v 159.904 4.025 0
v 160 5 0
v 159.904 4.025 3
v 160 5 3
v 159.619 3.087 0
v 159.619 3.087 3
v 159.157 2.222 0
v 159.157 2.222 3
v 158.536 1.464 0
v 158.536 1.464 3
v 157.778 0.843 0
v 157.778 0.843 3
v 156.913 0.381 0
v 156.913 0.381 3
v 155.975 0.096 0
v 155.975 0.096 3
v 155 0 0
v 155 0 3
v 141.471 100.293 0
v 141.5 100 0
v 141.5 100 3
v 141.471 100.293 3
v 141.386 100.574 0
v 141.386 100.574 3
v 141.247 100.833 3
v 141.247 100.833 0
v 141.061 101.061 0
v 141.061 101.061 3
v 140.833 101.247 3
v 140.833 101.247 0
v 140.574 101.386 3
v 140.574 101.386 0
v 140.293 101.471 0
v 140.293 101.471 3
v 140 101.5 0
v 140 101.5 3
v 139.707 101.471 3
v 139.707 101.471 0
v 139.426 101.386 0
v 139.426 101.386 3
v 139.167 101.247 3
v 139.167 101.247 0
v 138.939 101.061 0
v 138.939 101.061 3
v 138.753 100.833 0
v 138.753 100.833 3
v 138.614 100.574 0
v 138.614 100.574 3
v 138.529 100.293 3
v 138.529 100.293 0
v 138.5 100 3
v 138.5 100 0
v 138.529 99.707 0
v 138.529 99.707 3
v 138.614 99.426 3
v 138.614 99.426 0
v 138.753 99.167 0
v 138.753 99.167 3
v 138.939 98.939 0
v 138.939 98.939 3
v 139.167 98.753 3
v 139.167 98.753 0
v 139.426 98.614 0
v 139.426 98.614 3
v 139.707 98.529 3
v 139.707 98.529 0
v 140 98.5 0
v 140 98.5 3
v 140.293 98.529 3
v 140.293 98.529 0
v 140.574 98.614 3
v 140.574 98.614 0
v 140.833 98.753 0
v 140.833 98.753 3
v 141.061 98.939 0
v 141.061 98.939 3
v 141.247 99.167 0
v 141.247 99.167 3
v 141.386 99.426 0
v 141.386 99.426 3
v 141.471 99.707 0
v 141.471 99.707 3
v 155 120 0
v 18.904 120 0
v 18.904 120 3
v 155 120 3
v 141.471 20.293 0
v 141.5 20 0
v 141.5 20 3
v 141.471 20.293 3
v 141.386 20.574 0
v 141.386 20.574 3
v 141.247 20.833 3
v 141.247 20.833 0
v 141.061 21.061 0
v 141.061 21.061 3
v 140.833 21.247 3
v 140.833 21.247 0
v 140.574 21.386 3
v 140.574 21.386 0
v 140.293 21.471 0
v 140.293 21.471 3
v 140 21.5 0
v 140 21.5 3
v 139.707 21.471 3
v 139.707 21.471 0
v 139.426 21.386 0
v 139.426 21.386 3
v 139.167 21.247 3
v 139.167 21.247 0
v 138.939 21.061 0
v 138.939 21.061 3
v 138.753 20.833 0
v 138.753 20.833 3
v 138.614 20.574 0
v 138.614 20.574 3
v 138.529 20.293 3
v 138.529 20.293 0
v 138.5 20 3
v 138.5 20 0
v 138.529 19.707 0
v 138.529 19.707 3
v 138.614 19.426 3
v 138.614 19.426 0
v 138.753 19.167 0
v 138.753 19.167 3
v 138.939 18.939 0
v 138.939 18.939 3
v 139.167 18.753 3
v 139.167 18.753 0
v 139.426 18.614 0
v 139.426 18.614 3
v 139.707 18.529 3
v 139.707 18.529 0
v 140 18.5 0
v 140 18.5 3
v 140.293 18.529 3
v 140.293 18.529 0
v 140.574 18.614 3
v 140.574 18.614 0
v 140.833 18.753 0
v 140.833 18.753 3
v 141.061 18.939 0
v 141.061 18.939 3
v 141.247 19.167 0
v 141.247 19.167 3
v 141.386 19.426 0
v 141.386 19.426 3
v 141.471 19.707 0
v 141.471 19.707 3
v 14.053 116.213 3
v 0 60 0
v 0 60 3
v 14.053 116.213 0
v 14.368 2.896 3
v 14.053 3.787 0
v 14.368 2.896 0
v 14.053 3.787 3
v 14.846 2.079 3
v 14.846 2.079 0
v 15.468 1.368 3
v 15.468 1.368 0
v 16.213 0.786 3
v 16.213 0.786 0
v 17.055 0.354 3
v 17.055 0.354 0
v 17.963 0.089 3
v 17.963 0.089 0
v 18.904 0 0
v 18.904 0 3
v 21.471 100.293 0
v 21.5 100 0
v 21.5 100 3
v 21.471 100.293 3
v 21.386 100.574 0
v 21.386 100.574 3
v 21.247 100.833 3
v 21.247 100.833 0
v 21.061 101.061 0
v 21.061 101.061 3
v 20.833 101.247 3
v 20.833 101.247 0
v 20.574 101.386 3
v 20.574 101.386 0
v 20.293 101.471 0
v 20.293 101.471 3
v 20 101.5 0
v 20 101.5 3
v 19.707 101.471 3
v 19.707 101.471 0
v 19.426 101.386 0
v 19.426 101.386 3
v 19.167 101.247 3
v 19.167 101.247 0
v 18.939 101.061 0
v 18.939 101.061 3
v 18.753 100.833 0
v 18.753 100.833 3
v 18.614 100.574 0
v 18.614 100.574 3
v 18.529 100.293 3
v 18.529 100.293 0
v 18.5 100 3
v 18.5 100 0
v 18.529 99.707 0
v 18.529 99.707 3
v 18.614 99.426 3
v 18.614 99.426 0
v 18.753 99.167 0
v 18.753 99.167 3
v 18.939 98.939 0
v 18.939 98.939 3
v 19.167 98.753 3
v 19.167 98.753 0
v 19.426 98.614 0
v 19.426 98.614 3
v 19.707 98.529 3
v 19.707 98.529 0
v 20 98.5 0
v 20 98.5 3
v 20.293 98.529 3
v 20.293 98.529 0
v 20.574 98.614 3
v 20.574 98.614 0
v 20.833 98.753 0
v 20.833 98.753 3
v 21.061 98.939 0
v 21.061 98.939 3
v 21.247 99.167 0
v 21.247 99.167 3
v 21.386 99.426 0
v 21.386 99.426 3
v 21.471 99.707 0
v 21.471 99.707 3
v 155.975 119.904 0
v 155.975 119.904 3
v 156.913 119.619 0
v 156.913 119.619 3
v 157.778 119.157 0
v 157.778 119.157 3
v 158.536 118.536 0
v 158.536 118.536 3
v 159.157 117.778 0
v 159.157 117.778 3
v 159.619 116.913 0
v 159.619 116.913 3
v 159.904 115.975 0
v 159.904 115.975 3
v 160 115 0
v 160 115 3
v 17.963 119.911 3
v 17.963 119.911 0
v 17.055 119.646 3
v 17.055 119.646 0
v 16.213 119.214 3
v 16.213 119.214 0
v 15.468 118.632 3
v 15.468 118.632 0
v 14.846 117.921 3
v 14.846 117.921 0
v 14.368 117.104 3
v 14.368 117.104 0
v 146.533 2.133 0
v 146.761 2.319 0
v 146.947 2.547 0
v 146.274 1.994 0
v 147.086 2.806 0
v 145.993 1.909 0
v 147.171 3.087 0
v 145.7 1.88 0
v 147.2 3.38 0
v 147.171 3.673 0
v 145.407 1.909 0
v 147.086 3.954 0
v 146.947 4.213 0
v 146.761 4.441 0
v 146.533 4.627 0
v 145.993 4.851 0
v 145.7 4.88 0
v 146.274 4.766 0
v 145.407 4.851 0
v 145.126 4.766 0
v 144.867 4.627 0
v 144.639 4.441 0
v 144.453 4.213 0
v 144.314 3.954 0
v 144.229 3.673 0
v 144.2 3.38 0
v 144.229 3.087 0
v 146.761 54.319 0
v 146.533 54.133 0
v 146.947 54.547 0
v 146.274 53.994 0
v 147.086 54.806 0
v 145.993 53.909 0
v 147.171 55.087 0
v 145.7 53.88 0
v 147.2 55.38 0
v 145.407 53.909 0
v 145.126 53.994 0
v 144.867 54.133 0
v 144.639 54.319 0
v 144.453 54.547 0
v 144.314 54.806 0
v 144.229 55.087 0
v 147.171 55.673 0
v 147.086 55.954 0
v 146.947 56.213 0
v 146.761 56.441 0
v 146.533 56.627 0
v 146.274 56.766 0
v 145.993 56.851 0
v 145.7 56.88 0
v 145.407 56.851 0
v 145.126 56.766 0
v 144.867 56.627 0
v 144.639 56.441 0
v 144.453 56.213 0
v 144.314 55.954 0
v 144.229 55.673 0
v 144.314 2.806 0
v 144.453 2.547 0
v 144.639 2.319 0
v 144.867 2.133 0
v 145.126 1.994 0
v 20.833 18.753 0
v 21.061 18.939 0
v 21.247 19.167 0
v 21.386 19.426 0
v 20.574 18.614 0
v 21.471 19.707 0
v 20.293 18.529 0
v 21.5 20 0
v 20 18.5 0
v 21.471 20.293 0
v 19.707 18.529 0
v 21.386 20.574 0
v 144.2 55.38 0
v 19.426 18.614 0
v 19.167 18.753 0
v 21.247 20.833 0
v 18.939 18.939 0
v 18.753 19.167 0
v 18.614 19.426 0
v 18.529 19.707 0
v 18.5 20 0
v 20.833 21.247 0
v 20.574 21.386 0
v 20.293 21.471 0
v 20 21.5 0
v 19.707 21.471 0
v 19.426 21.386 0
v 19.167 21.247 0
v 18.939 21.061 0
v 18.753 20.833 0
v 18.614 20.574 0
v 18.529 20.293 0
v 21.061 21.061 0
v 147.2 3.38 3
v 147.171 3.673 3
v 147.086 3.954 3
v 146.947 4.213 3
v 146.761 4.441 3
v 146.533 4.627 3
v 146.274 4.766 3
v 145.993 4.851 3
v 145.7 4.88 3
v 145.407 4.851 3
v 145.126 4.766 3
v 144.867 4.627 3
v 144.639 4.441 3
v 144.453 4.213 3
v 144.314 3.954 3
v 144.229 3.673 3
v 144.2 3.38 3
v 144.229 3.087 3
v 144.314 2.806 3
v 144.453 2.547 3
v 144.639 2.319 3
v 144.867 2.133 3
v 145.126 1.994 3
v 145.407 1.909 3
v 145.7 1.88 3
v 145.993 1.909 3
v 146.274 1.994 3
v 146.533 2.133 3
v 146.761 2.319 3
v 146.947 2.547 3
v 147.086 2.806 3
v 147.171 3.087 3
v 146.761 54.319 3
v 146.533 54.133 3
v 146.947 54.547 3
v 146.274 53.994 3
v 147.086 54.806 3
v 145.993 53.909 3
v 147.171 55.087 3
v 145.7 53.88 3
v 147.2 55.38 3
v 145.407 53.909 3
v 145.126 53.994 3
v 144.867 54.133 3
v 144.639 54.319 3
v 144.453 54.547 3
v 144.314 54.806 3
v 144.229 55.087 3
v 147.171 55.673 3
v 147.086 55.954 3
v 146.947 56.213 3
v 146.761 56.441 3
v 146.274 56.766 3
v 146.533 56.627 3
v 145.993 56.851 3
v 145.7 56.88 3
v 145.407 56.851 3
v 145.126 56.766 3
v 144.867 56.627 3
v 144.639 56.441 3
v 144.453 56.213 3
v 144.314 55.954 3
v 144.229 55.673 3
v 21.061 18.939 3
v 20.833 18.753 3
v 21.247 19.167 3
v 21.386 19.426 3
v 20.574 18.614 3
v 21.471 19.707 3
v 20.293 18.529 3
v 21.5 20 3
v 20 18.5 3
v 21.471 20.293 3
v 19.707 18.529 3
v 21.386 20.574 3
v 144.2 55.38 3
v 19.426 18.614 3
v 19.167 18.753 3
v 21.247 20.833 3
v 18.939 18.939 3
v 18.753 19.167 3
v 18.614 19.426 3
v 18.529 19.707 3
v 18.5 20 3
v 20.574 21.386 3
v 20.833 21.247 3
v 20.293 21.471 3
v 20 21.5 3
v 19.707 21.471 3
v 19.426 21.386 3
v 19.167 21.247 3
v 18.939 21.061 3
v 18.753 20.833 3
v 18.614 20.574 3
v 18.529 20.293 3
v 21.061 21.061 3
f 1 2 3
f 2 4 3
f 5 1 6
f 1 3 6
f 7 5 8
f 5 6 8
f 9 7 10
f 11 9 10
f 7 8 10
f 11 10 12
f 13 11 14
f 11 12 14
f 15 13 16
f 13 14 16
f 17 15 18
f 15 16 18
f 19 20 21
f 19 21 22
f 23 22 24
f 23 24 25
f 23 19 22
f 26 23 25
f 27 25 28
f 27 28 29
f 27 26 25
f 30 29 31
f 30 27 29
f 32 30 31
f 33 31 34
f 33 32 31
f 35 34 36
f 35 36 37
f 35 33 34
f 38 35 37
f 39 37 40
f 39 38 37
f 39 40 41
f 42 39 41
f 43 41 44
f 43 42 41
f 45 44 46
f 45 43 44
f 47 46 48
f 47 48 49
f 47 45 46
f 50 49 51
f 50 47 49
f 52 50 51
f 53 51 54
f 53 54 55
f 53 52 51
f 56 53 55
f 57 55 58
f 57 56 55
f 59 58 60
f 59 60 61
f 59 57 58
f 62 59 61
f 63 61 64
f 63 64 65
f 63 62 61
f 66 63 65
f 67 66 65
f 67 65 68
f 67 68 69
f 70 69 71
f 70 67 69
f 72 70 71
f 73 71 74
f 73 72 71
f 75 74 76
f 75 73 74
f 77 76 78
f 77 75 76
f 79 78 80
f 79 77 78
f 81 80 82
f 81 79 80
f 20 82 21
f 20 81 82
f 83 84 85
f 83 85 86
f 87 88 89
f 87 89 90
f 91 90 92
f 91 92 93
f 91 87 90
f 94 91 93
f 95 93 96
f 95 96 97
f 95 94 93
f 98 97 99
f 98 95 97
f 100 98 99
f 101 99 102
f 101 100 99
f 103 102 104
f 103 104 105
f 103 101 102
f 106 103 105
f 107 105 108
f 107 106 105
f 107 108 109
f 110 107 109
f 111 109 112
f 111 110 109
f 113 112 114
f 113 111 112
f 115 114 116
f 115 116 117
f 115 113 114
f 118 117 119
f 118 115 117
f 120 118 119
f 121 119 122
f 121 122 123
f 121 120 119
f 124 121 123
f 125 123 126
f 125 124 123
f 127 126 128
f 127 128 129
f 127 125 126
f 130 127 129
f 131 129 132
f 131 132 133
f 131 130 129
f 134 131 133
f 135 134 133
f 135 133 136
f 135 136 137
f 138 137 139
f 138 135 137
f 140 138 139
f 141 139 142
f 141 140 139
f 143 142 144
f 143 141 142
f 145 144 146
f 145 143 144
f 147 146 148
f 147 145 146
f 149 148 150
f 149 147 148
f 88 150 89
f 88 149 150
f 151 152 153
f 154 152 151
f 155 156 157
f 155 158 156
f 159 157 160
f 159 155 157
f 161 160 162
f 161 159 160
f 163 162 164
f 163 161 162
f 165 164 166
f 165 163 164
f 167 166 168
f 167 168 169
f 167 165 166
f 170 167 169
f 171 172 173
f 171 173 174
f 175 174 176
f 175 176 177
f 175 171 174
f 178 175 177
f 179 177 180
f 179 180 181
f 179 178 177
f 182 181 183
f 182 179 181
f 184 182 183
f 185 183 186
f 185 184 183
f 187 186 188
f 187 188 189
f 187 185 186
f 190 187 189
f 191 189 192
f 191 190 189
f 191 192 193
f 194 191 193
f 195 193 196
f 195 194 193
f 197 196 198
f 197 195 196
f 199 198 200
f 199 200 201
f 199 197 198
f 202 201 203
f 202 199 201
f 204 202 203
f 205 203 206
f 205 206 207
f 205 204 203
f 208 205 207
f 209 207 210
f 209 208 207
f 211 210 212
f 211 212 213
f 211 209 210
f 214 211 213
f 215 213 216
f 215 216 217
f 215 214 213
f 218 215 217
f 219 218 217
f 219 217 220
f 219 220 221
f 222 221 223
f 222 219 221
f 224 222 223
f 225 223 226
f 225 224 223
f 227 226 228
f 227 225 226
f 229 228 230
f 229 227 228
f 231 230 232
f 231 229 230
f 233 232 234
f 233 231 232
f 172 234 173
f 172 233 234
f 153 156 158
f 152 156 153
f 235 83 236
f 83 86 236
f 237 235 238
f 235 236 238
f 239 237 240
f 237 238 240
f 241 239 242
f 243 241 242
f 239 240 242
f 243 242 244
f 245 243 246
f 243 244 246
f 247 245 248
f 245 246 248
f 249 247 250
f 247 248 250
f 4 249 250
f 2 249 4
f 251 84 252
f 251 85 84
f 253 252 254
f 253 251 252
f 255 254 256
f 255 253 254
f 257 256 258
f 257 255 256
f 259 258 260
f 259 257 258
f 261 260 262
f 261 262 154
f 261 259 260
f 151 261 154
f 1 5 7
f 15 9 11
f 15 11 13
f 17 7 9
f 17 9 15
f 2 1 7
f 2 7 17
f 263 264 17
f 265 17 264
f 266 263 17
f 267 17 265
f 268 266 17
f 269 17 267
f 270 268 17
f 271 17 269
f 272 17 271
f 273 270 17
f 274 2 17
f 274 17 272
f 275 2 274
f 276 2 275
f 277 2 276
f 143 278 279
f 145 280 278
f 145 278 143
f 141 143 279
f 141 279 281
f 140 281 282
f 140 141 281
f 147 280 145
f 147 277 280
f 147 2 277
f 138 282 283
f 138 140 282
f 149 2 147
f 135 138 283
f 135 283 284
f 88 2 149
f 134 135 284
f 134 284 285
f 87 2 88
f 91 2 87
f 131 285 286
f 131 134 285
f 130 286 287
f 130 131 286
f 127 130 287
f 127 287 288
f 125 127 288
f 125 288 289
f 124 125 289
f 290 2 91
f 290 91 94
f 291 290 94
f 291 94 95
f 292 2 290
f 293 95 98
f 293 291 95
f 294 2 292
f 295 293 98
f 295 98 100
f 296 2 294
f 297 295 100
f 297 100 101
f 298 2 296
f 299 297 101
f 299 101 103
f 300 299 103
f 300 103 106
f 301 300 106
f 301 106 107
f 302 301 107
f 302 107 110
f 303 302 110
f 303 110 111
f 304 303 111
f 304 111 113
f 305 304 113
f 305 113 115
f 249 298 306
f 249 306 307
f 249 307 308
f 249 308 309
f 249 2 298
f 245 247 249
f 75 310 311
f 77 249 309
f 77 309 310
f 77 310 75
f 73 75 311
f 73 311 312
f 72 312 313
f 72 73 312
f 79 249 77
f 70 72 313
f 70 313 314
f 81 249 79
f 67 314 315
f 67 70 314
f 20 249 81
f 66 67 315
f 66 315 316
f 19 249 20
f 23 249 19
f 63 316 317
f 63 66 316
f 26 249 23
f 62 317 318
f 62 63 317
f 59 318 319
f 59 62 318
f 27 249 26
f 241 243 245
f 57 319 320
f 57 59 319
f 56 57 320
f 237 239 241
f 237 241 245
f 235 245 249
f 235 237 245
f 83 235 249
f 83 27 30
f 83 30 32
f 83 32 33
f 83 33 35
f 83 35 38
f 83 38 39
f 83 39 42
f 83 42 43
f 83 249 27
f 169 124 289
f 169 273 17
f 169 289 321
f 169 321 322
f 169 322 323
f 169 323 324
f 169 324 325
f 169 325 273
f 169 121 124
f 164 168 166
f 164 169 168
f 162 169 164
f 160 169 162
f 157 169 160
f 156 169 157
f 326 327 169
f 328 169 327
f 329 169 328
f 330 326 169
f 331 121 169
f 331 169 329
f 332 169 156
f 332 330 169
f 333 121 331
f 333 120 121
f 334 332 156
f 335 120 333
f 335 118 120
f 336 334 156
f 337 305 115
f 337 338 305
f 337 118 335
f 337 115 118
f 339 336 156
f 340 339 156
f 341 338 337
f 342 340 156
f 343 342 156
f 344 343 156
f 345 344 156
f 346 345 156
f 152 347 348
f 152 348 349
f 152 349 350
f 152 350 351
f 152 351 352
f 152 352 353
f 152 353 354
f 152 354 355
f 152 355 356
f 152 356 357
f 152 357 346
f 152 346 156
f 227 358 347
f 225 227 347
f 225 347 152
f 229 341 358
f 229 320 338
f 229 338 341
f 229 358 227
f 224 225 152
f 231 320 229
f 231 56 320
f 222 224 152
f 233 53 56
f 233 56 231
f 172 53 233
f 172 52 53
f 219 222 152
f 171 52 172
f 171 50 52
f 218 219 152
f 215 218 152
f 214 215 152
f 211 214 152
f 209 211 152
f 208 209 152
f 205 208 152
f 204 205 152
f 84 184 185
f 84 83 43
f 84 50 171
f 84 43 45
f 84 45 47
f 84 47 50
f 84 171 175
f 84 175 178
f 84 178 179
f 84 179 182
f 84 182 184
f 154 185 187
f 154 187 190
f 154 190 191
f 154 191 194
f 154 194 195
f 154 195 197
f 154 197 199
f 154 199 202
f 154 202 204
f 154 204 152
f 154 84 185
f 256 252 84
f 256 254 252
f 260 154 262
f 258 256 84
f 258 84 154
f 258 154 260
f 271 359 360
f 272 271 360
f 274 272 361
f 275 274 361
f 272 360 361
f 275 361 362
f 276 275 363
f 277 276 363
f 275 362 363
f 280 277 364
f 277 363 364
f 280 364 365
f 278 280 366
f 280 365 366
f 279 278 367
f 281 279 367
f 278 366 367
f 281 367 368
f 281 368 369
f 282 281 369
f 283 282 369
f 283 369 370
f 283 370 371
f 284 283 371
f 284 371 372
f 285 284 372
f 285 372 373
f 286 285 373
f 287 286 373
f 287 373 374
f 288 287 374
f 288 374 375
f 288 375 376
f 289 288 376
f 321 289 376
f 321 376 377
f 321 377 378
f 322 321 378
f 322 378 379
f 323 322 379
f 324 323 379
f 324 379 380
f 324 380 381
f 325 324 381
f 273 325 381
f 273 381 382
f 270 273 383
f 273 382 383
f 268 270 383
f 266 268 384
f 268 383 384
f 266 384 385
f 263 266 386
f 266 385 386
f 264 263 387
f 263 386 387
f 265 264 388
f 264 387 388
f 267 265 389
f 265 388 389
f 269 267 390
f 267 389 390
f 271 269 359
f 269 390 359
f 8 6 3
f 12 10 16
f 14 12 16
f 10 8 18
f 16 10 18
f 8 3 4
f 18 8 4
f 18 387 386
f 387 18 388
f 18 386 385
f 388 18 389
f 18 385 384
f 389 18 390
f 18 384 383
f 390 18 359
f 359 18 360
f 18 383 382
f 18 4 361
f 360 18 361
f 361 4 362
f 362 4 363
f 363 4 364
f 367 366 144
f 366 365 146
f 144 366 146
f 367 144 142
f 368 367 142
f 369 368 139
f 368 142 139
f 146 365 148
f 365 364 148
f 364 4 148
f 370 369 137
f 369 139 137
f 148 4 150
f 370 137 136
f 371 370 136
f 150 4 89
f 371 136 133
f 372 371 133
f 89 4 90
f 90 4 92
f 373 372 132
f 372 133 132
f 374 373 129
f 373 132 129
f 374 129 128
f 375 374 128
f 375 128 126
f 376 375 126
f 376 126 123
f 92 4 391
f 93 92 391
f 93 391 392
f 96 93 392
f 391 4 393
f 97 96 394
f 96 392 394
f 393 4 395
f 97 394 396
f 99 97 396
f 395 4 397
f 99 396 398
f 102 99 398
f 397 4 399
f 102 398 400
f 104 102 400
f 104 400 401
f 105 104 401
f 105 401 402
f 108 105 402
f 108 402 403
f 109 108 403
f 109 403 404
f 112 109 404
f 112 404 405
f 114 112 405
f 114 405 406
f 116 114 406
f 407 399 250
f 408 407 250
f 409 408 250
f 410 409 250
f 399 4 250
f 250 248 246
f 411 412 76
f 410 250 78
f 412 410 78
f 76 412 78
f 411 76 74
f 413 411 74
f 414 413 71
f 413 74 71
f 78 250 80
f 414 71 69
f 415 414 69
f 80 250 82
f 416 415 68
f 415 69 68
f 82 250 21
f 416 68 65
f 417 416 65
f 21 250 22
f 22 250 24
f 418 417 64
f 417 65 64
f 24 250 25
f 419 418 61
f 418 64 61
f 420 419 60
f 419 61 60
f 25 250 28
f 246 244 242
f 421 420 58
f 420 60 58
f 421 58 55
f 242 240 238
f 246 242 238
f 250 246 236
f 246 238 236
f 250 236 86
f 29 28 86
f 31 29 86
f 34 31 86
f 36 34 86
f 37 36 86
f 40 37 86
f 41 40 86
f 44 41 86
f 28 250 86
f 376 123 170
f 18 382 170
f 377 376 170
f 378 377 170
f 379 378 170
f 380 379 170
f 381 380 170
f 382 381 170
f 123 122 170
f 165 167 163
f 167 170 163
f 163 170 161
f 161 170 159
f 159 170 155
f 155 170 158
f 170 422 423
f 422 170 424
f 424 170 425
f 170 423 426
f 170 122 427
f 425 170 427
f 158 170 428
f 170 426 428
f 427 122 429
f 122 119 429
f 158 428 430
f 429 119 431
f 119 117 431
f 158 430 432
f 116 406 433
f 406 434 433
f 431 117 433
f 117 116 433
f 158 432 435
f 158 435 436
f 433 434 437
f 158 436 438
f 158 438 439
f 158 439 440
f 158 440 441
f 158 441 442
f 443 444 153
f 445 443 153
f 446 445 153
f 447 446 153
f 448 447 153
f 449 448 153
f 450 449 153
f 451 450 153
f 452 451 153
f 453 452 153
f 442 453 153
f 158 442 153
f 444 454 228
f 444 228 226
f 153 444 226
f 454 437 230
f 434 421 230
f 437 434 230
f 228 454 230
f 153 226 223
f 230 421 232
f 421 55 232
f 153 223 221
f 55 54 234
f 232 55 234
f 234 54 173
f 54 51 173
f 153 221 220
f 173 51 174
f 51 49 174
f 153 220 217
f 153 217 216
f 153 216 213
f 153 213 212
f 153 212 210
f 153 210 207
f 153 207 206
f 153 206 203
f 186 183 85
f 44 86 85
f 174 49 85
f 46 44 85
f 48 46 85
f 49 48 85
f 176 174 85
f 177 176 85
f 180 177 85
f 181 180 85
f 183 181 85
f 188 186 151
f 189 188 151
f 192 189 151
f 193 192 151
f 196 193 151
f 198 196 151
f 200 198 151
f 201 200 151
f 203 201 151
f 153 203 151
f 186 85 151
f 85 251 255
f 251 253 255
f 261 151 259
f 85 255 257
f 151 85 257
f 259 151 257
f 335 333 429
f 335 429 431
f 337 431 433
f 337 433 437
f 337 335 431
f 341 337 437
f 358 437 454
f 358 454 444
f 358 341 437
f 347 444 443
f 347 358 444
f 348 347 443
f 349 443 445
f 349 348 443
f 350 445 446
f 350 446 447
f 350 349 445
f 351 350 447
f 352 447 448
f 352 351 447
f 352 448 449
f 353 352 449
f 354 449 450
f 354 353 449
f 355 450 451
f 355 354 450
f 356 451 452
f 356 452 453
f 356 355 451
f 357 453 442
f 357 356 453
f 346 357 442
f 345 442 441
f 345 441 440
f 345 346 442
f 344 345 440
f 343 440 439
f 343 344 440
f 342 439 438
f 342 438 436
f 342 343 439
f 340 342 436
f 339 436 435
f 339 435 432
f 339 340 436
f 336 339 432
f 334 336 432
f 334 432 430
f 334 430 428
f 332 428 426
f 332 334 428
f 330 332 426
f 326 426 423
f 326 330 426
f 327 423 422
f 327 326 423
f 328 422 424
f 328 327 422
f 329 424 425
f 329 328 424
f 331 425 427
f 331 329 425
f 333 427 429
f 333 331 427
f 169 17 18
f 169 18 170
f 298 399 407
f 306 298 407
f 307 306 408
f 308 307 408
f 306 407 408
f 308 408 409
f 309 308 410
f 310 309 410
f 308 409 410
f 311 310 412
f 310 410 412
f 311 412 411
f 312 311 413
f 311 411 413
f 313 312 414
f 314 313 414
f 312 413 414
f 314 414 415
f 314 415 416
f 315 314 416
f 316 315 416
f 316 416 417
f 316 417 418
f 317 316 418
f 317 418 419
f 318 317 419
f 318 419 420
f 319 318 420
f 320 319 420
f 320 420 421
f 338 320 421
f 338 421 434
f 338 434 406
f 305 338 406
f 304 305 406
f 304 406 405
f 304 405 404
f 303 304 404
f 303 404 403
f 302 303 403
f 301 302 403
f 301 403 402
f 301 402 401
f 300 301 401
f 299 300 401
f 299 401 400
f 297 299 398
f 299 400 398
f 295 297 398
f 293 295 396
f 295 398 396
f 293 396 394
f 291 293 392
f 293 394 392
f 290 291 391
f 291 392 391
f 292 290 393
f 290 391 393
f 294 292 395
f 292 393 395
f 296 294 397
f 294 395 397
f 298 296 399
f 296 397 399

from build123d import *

# Parameters (mm, degrees)
SKETCH_1_R          = 1.5
EXTRUDE_1_DEPTH     = 3
FILLET_1_R          = 5
SKETCH_2_R          = 1.5
CUT_EXTRUDE_1_DEPTH = 10


with BuildPart() as part:
    # 草圖1 → 填料-伸長1 (new body)
    with BuildSketch(Plane.XY):
        Polygon((15, 120), (160, 120), (160, 0), (15, 0), (0, 60), align=None)
        with Locations((20, 20)):
            Circle(SKETCH_1_R, mode=Mode.SUBTRACT)
        with Locations((20, 100)):
            Circle(SKETCH_1_R, mode=Mode.SUBTRACT)
        with Locations((140, 20)):
            Circle(SKETCH_1_R, mode=Mode.SUBTRACT)
        with Locations((140, 100)):
            Circle(SKETCH_1_R, mode=Mode.SUBTRACT)
    extrude(amount=EXTRUDE_1_DEPTH)

    # 圓角1
    fillet_1_edges = [part.edges().sort_by_distance(p)[0] for p in [
        (160, 0, 1.5),
        (15, 0, 1.5),
        (15, 120, 1.5),
        (160, 120, 1.5),
    ]]
    fillet(fillet_1_edges, radius=FILLET_1_R)

    # 草圖2 → 除料-伸長1 (cut)
    with BuildSketch(Plane.XY.offset(3)):
        with Locations((145.7, 3.38)):
            Circle(SKETCH_2_R)
        with Locations((145.7, 55.38)):
            Circle(SKETCH_2_R)
    extrude(amount=-CUT_EXTRUDE_1_DEPTH, mode=Mode.SUBTRACT)


solid = part.part
